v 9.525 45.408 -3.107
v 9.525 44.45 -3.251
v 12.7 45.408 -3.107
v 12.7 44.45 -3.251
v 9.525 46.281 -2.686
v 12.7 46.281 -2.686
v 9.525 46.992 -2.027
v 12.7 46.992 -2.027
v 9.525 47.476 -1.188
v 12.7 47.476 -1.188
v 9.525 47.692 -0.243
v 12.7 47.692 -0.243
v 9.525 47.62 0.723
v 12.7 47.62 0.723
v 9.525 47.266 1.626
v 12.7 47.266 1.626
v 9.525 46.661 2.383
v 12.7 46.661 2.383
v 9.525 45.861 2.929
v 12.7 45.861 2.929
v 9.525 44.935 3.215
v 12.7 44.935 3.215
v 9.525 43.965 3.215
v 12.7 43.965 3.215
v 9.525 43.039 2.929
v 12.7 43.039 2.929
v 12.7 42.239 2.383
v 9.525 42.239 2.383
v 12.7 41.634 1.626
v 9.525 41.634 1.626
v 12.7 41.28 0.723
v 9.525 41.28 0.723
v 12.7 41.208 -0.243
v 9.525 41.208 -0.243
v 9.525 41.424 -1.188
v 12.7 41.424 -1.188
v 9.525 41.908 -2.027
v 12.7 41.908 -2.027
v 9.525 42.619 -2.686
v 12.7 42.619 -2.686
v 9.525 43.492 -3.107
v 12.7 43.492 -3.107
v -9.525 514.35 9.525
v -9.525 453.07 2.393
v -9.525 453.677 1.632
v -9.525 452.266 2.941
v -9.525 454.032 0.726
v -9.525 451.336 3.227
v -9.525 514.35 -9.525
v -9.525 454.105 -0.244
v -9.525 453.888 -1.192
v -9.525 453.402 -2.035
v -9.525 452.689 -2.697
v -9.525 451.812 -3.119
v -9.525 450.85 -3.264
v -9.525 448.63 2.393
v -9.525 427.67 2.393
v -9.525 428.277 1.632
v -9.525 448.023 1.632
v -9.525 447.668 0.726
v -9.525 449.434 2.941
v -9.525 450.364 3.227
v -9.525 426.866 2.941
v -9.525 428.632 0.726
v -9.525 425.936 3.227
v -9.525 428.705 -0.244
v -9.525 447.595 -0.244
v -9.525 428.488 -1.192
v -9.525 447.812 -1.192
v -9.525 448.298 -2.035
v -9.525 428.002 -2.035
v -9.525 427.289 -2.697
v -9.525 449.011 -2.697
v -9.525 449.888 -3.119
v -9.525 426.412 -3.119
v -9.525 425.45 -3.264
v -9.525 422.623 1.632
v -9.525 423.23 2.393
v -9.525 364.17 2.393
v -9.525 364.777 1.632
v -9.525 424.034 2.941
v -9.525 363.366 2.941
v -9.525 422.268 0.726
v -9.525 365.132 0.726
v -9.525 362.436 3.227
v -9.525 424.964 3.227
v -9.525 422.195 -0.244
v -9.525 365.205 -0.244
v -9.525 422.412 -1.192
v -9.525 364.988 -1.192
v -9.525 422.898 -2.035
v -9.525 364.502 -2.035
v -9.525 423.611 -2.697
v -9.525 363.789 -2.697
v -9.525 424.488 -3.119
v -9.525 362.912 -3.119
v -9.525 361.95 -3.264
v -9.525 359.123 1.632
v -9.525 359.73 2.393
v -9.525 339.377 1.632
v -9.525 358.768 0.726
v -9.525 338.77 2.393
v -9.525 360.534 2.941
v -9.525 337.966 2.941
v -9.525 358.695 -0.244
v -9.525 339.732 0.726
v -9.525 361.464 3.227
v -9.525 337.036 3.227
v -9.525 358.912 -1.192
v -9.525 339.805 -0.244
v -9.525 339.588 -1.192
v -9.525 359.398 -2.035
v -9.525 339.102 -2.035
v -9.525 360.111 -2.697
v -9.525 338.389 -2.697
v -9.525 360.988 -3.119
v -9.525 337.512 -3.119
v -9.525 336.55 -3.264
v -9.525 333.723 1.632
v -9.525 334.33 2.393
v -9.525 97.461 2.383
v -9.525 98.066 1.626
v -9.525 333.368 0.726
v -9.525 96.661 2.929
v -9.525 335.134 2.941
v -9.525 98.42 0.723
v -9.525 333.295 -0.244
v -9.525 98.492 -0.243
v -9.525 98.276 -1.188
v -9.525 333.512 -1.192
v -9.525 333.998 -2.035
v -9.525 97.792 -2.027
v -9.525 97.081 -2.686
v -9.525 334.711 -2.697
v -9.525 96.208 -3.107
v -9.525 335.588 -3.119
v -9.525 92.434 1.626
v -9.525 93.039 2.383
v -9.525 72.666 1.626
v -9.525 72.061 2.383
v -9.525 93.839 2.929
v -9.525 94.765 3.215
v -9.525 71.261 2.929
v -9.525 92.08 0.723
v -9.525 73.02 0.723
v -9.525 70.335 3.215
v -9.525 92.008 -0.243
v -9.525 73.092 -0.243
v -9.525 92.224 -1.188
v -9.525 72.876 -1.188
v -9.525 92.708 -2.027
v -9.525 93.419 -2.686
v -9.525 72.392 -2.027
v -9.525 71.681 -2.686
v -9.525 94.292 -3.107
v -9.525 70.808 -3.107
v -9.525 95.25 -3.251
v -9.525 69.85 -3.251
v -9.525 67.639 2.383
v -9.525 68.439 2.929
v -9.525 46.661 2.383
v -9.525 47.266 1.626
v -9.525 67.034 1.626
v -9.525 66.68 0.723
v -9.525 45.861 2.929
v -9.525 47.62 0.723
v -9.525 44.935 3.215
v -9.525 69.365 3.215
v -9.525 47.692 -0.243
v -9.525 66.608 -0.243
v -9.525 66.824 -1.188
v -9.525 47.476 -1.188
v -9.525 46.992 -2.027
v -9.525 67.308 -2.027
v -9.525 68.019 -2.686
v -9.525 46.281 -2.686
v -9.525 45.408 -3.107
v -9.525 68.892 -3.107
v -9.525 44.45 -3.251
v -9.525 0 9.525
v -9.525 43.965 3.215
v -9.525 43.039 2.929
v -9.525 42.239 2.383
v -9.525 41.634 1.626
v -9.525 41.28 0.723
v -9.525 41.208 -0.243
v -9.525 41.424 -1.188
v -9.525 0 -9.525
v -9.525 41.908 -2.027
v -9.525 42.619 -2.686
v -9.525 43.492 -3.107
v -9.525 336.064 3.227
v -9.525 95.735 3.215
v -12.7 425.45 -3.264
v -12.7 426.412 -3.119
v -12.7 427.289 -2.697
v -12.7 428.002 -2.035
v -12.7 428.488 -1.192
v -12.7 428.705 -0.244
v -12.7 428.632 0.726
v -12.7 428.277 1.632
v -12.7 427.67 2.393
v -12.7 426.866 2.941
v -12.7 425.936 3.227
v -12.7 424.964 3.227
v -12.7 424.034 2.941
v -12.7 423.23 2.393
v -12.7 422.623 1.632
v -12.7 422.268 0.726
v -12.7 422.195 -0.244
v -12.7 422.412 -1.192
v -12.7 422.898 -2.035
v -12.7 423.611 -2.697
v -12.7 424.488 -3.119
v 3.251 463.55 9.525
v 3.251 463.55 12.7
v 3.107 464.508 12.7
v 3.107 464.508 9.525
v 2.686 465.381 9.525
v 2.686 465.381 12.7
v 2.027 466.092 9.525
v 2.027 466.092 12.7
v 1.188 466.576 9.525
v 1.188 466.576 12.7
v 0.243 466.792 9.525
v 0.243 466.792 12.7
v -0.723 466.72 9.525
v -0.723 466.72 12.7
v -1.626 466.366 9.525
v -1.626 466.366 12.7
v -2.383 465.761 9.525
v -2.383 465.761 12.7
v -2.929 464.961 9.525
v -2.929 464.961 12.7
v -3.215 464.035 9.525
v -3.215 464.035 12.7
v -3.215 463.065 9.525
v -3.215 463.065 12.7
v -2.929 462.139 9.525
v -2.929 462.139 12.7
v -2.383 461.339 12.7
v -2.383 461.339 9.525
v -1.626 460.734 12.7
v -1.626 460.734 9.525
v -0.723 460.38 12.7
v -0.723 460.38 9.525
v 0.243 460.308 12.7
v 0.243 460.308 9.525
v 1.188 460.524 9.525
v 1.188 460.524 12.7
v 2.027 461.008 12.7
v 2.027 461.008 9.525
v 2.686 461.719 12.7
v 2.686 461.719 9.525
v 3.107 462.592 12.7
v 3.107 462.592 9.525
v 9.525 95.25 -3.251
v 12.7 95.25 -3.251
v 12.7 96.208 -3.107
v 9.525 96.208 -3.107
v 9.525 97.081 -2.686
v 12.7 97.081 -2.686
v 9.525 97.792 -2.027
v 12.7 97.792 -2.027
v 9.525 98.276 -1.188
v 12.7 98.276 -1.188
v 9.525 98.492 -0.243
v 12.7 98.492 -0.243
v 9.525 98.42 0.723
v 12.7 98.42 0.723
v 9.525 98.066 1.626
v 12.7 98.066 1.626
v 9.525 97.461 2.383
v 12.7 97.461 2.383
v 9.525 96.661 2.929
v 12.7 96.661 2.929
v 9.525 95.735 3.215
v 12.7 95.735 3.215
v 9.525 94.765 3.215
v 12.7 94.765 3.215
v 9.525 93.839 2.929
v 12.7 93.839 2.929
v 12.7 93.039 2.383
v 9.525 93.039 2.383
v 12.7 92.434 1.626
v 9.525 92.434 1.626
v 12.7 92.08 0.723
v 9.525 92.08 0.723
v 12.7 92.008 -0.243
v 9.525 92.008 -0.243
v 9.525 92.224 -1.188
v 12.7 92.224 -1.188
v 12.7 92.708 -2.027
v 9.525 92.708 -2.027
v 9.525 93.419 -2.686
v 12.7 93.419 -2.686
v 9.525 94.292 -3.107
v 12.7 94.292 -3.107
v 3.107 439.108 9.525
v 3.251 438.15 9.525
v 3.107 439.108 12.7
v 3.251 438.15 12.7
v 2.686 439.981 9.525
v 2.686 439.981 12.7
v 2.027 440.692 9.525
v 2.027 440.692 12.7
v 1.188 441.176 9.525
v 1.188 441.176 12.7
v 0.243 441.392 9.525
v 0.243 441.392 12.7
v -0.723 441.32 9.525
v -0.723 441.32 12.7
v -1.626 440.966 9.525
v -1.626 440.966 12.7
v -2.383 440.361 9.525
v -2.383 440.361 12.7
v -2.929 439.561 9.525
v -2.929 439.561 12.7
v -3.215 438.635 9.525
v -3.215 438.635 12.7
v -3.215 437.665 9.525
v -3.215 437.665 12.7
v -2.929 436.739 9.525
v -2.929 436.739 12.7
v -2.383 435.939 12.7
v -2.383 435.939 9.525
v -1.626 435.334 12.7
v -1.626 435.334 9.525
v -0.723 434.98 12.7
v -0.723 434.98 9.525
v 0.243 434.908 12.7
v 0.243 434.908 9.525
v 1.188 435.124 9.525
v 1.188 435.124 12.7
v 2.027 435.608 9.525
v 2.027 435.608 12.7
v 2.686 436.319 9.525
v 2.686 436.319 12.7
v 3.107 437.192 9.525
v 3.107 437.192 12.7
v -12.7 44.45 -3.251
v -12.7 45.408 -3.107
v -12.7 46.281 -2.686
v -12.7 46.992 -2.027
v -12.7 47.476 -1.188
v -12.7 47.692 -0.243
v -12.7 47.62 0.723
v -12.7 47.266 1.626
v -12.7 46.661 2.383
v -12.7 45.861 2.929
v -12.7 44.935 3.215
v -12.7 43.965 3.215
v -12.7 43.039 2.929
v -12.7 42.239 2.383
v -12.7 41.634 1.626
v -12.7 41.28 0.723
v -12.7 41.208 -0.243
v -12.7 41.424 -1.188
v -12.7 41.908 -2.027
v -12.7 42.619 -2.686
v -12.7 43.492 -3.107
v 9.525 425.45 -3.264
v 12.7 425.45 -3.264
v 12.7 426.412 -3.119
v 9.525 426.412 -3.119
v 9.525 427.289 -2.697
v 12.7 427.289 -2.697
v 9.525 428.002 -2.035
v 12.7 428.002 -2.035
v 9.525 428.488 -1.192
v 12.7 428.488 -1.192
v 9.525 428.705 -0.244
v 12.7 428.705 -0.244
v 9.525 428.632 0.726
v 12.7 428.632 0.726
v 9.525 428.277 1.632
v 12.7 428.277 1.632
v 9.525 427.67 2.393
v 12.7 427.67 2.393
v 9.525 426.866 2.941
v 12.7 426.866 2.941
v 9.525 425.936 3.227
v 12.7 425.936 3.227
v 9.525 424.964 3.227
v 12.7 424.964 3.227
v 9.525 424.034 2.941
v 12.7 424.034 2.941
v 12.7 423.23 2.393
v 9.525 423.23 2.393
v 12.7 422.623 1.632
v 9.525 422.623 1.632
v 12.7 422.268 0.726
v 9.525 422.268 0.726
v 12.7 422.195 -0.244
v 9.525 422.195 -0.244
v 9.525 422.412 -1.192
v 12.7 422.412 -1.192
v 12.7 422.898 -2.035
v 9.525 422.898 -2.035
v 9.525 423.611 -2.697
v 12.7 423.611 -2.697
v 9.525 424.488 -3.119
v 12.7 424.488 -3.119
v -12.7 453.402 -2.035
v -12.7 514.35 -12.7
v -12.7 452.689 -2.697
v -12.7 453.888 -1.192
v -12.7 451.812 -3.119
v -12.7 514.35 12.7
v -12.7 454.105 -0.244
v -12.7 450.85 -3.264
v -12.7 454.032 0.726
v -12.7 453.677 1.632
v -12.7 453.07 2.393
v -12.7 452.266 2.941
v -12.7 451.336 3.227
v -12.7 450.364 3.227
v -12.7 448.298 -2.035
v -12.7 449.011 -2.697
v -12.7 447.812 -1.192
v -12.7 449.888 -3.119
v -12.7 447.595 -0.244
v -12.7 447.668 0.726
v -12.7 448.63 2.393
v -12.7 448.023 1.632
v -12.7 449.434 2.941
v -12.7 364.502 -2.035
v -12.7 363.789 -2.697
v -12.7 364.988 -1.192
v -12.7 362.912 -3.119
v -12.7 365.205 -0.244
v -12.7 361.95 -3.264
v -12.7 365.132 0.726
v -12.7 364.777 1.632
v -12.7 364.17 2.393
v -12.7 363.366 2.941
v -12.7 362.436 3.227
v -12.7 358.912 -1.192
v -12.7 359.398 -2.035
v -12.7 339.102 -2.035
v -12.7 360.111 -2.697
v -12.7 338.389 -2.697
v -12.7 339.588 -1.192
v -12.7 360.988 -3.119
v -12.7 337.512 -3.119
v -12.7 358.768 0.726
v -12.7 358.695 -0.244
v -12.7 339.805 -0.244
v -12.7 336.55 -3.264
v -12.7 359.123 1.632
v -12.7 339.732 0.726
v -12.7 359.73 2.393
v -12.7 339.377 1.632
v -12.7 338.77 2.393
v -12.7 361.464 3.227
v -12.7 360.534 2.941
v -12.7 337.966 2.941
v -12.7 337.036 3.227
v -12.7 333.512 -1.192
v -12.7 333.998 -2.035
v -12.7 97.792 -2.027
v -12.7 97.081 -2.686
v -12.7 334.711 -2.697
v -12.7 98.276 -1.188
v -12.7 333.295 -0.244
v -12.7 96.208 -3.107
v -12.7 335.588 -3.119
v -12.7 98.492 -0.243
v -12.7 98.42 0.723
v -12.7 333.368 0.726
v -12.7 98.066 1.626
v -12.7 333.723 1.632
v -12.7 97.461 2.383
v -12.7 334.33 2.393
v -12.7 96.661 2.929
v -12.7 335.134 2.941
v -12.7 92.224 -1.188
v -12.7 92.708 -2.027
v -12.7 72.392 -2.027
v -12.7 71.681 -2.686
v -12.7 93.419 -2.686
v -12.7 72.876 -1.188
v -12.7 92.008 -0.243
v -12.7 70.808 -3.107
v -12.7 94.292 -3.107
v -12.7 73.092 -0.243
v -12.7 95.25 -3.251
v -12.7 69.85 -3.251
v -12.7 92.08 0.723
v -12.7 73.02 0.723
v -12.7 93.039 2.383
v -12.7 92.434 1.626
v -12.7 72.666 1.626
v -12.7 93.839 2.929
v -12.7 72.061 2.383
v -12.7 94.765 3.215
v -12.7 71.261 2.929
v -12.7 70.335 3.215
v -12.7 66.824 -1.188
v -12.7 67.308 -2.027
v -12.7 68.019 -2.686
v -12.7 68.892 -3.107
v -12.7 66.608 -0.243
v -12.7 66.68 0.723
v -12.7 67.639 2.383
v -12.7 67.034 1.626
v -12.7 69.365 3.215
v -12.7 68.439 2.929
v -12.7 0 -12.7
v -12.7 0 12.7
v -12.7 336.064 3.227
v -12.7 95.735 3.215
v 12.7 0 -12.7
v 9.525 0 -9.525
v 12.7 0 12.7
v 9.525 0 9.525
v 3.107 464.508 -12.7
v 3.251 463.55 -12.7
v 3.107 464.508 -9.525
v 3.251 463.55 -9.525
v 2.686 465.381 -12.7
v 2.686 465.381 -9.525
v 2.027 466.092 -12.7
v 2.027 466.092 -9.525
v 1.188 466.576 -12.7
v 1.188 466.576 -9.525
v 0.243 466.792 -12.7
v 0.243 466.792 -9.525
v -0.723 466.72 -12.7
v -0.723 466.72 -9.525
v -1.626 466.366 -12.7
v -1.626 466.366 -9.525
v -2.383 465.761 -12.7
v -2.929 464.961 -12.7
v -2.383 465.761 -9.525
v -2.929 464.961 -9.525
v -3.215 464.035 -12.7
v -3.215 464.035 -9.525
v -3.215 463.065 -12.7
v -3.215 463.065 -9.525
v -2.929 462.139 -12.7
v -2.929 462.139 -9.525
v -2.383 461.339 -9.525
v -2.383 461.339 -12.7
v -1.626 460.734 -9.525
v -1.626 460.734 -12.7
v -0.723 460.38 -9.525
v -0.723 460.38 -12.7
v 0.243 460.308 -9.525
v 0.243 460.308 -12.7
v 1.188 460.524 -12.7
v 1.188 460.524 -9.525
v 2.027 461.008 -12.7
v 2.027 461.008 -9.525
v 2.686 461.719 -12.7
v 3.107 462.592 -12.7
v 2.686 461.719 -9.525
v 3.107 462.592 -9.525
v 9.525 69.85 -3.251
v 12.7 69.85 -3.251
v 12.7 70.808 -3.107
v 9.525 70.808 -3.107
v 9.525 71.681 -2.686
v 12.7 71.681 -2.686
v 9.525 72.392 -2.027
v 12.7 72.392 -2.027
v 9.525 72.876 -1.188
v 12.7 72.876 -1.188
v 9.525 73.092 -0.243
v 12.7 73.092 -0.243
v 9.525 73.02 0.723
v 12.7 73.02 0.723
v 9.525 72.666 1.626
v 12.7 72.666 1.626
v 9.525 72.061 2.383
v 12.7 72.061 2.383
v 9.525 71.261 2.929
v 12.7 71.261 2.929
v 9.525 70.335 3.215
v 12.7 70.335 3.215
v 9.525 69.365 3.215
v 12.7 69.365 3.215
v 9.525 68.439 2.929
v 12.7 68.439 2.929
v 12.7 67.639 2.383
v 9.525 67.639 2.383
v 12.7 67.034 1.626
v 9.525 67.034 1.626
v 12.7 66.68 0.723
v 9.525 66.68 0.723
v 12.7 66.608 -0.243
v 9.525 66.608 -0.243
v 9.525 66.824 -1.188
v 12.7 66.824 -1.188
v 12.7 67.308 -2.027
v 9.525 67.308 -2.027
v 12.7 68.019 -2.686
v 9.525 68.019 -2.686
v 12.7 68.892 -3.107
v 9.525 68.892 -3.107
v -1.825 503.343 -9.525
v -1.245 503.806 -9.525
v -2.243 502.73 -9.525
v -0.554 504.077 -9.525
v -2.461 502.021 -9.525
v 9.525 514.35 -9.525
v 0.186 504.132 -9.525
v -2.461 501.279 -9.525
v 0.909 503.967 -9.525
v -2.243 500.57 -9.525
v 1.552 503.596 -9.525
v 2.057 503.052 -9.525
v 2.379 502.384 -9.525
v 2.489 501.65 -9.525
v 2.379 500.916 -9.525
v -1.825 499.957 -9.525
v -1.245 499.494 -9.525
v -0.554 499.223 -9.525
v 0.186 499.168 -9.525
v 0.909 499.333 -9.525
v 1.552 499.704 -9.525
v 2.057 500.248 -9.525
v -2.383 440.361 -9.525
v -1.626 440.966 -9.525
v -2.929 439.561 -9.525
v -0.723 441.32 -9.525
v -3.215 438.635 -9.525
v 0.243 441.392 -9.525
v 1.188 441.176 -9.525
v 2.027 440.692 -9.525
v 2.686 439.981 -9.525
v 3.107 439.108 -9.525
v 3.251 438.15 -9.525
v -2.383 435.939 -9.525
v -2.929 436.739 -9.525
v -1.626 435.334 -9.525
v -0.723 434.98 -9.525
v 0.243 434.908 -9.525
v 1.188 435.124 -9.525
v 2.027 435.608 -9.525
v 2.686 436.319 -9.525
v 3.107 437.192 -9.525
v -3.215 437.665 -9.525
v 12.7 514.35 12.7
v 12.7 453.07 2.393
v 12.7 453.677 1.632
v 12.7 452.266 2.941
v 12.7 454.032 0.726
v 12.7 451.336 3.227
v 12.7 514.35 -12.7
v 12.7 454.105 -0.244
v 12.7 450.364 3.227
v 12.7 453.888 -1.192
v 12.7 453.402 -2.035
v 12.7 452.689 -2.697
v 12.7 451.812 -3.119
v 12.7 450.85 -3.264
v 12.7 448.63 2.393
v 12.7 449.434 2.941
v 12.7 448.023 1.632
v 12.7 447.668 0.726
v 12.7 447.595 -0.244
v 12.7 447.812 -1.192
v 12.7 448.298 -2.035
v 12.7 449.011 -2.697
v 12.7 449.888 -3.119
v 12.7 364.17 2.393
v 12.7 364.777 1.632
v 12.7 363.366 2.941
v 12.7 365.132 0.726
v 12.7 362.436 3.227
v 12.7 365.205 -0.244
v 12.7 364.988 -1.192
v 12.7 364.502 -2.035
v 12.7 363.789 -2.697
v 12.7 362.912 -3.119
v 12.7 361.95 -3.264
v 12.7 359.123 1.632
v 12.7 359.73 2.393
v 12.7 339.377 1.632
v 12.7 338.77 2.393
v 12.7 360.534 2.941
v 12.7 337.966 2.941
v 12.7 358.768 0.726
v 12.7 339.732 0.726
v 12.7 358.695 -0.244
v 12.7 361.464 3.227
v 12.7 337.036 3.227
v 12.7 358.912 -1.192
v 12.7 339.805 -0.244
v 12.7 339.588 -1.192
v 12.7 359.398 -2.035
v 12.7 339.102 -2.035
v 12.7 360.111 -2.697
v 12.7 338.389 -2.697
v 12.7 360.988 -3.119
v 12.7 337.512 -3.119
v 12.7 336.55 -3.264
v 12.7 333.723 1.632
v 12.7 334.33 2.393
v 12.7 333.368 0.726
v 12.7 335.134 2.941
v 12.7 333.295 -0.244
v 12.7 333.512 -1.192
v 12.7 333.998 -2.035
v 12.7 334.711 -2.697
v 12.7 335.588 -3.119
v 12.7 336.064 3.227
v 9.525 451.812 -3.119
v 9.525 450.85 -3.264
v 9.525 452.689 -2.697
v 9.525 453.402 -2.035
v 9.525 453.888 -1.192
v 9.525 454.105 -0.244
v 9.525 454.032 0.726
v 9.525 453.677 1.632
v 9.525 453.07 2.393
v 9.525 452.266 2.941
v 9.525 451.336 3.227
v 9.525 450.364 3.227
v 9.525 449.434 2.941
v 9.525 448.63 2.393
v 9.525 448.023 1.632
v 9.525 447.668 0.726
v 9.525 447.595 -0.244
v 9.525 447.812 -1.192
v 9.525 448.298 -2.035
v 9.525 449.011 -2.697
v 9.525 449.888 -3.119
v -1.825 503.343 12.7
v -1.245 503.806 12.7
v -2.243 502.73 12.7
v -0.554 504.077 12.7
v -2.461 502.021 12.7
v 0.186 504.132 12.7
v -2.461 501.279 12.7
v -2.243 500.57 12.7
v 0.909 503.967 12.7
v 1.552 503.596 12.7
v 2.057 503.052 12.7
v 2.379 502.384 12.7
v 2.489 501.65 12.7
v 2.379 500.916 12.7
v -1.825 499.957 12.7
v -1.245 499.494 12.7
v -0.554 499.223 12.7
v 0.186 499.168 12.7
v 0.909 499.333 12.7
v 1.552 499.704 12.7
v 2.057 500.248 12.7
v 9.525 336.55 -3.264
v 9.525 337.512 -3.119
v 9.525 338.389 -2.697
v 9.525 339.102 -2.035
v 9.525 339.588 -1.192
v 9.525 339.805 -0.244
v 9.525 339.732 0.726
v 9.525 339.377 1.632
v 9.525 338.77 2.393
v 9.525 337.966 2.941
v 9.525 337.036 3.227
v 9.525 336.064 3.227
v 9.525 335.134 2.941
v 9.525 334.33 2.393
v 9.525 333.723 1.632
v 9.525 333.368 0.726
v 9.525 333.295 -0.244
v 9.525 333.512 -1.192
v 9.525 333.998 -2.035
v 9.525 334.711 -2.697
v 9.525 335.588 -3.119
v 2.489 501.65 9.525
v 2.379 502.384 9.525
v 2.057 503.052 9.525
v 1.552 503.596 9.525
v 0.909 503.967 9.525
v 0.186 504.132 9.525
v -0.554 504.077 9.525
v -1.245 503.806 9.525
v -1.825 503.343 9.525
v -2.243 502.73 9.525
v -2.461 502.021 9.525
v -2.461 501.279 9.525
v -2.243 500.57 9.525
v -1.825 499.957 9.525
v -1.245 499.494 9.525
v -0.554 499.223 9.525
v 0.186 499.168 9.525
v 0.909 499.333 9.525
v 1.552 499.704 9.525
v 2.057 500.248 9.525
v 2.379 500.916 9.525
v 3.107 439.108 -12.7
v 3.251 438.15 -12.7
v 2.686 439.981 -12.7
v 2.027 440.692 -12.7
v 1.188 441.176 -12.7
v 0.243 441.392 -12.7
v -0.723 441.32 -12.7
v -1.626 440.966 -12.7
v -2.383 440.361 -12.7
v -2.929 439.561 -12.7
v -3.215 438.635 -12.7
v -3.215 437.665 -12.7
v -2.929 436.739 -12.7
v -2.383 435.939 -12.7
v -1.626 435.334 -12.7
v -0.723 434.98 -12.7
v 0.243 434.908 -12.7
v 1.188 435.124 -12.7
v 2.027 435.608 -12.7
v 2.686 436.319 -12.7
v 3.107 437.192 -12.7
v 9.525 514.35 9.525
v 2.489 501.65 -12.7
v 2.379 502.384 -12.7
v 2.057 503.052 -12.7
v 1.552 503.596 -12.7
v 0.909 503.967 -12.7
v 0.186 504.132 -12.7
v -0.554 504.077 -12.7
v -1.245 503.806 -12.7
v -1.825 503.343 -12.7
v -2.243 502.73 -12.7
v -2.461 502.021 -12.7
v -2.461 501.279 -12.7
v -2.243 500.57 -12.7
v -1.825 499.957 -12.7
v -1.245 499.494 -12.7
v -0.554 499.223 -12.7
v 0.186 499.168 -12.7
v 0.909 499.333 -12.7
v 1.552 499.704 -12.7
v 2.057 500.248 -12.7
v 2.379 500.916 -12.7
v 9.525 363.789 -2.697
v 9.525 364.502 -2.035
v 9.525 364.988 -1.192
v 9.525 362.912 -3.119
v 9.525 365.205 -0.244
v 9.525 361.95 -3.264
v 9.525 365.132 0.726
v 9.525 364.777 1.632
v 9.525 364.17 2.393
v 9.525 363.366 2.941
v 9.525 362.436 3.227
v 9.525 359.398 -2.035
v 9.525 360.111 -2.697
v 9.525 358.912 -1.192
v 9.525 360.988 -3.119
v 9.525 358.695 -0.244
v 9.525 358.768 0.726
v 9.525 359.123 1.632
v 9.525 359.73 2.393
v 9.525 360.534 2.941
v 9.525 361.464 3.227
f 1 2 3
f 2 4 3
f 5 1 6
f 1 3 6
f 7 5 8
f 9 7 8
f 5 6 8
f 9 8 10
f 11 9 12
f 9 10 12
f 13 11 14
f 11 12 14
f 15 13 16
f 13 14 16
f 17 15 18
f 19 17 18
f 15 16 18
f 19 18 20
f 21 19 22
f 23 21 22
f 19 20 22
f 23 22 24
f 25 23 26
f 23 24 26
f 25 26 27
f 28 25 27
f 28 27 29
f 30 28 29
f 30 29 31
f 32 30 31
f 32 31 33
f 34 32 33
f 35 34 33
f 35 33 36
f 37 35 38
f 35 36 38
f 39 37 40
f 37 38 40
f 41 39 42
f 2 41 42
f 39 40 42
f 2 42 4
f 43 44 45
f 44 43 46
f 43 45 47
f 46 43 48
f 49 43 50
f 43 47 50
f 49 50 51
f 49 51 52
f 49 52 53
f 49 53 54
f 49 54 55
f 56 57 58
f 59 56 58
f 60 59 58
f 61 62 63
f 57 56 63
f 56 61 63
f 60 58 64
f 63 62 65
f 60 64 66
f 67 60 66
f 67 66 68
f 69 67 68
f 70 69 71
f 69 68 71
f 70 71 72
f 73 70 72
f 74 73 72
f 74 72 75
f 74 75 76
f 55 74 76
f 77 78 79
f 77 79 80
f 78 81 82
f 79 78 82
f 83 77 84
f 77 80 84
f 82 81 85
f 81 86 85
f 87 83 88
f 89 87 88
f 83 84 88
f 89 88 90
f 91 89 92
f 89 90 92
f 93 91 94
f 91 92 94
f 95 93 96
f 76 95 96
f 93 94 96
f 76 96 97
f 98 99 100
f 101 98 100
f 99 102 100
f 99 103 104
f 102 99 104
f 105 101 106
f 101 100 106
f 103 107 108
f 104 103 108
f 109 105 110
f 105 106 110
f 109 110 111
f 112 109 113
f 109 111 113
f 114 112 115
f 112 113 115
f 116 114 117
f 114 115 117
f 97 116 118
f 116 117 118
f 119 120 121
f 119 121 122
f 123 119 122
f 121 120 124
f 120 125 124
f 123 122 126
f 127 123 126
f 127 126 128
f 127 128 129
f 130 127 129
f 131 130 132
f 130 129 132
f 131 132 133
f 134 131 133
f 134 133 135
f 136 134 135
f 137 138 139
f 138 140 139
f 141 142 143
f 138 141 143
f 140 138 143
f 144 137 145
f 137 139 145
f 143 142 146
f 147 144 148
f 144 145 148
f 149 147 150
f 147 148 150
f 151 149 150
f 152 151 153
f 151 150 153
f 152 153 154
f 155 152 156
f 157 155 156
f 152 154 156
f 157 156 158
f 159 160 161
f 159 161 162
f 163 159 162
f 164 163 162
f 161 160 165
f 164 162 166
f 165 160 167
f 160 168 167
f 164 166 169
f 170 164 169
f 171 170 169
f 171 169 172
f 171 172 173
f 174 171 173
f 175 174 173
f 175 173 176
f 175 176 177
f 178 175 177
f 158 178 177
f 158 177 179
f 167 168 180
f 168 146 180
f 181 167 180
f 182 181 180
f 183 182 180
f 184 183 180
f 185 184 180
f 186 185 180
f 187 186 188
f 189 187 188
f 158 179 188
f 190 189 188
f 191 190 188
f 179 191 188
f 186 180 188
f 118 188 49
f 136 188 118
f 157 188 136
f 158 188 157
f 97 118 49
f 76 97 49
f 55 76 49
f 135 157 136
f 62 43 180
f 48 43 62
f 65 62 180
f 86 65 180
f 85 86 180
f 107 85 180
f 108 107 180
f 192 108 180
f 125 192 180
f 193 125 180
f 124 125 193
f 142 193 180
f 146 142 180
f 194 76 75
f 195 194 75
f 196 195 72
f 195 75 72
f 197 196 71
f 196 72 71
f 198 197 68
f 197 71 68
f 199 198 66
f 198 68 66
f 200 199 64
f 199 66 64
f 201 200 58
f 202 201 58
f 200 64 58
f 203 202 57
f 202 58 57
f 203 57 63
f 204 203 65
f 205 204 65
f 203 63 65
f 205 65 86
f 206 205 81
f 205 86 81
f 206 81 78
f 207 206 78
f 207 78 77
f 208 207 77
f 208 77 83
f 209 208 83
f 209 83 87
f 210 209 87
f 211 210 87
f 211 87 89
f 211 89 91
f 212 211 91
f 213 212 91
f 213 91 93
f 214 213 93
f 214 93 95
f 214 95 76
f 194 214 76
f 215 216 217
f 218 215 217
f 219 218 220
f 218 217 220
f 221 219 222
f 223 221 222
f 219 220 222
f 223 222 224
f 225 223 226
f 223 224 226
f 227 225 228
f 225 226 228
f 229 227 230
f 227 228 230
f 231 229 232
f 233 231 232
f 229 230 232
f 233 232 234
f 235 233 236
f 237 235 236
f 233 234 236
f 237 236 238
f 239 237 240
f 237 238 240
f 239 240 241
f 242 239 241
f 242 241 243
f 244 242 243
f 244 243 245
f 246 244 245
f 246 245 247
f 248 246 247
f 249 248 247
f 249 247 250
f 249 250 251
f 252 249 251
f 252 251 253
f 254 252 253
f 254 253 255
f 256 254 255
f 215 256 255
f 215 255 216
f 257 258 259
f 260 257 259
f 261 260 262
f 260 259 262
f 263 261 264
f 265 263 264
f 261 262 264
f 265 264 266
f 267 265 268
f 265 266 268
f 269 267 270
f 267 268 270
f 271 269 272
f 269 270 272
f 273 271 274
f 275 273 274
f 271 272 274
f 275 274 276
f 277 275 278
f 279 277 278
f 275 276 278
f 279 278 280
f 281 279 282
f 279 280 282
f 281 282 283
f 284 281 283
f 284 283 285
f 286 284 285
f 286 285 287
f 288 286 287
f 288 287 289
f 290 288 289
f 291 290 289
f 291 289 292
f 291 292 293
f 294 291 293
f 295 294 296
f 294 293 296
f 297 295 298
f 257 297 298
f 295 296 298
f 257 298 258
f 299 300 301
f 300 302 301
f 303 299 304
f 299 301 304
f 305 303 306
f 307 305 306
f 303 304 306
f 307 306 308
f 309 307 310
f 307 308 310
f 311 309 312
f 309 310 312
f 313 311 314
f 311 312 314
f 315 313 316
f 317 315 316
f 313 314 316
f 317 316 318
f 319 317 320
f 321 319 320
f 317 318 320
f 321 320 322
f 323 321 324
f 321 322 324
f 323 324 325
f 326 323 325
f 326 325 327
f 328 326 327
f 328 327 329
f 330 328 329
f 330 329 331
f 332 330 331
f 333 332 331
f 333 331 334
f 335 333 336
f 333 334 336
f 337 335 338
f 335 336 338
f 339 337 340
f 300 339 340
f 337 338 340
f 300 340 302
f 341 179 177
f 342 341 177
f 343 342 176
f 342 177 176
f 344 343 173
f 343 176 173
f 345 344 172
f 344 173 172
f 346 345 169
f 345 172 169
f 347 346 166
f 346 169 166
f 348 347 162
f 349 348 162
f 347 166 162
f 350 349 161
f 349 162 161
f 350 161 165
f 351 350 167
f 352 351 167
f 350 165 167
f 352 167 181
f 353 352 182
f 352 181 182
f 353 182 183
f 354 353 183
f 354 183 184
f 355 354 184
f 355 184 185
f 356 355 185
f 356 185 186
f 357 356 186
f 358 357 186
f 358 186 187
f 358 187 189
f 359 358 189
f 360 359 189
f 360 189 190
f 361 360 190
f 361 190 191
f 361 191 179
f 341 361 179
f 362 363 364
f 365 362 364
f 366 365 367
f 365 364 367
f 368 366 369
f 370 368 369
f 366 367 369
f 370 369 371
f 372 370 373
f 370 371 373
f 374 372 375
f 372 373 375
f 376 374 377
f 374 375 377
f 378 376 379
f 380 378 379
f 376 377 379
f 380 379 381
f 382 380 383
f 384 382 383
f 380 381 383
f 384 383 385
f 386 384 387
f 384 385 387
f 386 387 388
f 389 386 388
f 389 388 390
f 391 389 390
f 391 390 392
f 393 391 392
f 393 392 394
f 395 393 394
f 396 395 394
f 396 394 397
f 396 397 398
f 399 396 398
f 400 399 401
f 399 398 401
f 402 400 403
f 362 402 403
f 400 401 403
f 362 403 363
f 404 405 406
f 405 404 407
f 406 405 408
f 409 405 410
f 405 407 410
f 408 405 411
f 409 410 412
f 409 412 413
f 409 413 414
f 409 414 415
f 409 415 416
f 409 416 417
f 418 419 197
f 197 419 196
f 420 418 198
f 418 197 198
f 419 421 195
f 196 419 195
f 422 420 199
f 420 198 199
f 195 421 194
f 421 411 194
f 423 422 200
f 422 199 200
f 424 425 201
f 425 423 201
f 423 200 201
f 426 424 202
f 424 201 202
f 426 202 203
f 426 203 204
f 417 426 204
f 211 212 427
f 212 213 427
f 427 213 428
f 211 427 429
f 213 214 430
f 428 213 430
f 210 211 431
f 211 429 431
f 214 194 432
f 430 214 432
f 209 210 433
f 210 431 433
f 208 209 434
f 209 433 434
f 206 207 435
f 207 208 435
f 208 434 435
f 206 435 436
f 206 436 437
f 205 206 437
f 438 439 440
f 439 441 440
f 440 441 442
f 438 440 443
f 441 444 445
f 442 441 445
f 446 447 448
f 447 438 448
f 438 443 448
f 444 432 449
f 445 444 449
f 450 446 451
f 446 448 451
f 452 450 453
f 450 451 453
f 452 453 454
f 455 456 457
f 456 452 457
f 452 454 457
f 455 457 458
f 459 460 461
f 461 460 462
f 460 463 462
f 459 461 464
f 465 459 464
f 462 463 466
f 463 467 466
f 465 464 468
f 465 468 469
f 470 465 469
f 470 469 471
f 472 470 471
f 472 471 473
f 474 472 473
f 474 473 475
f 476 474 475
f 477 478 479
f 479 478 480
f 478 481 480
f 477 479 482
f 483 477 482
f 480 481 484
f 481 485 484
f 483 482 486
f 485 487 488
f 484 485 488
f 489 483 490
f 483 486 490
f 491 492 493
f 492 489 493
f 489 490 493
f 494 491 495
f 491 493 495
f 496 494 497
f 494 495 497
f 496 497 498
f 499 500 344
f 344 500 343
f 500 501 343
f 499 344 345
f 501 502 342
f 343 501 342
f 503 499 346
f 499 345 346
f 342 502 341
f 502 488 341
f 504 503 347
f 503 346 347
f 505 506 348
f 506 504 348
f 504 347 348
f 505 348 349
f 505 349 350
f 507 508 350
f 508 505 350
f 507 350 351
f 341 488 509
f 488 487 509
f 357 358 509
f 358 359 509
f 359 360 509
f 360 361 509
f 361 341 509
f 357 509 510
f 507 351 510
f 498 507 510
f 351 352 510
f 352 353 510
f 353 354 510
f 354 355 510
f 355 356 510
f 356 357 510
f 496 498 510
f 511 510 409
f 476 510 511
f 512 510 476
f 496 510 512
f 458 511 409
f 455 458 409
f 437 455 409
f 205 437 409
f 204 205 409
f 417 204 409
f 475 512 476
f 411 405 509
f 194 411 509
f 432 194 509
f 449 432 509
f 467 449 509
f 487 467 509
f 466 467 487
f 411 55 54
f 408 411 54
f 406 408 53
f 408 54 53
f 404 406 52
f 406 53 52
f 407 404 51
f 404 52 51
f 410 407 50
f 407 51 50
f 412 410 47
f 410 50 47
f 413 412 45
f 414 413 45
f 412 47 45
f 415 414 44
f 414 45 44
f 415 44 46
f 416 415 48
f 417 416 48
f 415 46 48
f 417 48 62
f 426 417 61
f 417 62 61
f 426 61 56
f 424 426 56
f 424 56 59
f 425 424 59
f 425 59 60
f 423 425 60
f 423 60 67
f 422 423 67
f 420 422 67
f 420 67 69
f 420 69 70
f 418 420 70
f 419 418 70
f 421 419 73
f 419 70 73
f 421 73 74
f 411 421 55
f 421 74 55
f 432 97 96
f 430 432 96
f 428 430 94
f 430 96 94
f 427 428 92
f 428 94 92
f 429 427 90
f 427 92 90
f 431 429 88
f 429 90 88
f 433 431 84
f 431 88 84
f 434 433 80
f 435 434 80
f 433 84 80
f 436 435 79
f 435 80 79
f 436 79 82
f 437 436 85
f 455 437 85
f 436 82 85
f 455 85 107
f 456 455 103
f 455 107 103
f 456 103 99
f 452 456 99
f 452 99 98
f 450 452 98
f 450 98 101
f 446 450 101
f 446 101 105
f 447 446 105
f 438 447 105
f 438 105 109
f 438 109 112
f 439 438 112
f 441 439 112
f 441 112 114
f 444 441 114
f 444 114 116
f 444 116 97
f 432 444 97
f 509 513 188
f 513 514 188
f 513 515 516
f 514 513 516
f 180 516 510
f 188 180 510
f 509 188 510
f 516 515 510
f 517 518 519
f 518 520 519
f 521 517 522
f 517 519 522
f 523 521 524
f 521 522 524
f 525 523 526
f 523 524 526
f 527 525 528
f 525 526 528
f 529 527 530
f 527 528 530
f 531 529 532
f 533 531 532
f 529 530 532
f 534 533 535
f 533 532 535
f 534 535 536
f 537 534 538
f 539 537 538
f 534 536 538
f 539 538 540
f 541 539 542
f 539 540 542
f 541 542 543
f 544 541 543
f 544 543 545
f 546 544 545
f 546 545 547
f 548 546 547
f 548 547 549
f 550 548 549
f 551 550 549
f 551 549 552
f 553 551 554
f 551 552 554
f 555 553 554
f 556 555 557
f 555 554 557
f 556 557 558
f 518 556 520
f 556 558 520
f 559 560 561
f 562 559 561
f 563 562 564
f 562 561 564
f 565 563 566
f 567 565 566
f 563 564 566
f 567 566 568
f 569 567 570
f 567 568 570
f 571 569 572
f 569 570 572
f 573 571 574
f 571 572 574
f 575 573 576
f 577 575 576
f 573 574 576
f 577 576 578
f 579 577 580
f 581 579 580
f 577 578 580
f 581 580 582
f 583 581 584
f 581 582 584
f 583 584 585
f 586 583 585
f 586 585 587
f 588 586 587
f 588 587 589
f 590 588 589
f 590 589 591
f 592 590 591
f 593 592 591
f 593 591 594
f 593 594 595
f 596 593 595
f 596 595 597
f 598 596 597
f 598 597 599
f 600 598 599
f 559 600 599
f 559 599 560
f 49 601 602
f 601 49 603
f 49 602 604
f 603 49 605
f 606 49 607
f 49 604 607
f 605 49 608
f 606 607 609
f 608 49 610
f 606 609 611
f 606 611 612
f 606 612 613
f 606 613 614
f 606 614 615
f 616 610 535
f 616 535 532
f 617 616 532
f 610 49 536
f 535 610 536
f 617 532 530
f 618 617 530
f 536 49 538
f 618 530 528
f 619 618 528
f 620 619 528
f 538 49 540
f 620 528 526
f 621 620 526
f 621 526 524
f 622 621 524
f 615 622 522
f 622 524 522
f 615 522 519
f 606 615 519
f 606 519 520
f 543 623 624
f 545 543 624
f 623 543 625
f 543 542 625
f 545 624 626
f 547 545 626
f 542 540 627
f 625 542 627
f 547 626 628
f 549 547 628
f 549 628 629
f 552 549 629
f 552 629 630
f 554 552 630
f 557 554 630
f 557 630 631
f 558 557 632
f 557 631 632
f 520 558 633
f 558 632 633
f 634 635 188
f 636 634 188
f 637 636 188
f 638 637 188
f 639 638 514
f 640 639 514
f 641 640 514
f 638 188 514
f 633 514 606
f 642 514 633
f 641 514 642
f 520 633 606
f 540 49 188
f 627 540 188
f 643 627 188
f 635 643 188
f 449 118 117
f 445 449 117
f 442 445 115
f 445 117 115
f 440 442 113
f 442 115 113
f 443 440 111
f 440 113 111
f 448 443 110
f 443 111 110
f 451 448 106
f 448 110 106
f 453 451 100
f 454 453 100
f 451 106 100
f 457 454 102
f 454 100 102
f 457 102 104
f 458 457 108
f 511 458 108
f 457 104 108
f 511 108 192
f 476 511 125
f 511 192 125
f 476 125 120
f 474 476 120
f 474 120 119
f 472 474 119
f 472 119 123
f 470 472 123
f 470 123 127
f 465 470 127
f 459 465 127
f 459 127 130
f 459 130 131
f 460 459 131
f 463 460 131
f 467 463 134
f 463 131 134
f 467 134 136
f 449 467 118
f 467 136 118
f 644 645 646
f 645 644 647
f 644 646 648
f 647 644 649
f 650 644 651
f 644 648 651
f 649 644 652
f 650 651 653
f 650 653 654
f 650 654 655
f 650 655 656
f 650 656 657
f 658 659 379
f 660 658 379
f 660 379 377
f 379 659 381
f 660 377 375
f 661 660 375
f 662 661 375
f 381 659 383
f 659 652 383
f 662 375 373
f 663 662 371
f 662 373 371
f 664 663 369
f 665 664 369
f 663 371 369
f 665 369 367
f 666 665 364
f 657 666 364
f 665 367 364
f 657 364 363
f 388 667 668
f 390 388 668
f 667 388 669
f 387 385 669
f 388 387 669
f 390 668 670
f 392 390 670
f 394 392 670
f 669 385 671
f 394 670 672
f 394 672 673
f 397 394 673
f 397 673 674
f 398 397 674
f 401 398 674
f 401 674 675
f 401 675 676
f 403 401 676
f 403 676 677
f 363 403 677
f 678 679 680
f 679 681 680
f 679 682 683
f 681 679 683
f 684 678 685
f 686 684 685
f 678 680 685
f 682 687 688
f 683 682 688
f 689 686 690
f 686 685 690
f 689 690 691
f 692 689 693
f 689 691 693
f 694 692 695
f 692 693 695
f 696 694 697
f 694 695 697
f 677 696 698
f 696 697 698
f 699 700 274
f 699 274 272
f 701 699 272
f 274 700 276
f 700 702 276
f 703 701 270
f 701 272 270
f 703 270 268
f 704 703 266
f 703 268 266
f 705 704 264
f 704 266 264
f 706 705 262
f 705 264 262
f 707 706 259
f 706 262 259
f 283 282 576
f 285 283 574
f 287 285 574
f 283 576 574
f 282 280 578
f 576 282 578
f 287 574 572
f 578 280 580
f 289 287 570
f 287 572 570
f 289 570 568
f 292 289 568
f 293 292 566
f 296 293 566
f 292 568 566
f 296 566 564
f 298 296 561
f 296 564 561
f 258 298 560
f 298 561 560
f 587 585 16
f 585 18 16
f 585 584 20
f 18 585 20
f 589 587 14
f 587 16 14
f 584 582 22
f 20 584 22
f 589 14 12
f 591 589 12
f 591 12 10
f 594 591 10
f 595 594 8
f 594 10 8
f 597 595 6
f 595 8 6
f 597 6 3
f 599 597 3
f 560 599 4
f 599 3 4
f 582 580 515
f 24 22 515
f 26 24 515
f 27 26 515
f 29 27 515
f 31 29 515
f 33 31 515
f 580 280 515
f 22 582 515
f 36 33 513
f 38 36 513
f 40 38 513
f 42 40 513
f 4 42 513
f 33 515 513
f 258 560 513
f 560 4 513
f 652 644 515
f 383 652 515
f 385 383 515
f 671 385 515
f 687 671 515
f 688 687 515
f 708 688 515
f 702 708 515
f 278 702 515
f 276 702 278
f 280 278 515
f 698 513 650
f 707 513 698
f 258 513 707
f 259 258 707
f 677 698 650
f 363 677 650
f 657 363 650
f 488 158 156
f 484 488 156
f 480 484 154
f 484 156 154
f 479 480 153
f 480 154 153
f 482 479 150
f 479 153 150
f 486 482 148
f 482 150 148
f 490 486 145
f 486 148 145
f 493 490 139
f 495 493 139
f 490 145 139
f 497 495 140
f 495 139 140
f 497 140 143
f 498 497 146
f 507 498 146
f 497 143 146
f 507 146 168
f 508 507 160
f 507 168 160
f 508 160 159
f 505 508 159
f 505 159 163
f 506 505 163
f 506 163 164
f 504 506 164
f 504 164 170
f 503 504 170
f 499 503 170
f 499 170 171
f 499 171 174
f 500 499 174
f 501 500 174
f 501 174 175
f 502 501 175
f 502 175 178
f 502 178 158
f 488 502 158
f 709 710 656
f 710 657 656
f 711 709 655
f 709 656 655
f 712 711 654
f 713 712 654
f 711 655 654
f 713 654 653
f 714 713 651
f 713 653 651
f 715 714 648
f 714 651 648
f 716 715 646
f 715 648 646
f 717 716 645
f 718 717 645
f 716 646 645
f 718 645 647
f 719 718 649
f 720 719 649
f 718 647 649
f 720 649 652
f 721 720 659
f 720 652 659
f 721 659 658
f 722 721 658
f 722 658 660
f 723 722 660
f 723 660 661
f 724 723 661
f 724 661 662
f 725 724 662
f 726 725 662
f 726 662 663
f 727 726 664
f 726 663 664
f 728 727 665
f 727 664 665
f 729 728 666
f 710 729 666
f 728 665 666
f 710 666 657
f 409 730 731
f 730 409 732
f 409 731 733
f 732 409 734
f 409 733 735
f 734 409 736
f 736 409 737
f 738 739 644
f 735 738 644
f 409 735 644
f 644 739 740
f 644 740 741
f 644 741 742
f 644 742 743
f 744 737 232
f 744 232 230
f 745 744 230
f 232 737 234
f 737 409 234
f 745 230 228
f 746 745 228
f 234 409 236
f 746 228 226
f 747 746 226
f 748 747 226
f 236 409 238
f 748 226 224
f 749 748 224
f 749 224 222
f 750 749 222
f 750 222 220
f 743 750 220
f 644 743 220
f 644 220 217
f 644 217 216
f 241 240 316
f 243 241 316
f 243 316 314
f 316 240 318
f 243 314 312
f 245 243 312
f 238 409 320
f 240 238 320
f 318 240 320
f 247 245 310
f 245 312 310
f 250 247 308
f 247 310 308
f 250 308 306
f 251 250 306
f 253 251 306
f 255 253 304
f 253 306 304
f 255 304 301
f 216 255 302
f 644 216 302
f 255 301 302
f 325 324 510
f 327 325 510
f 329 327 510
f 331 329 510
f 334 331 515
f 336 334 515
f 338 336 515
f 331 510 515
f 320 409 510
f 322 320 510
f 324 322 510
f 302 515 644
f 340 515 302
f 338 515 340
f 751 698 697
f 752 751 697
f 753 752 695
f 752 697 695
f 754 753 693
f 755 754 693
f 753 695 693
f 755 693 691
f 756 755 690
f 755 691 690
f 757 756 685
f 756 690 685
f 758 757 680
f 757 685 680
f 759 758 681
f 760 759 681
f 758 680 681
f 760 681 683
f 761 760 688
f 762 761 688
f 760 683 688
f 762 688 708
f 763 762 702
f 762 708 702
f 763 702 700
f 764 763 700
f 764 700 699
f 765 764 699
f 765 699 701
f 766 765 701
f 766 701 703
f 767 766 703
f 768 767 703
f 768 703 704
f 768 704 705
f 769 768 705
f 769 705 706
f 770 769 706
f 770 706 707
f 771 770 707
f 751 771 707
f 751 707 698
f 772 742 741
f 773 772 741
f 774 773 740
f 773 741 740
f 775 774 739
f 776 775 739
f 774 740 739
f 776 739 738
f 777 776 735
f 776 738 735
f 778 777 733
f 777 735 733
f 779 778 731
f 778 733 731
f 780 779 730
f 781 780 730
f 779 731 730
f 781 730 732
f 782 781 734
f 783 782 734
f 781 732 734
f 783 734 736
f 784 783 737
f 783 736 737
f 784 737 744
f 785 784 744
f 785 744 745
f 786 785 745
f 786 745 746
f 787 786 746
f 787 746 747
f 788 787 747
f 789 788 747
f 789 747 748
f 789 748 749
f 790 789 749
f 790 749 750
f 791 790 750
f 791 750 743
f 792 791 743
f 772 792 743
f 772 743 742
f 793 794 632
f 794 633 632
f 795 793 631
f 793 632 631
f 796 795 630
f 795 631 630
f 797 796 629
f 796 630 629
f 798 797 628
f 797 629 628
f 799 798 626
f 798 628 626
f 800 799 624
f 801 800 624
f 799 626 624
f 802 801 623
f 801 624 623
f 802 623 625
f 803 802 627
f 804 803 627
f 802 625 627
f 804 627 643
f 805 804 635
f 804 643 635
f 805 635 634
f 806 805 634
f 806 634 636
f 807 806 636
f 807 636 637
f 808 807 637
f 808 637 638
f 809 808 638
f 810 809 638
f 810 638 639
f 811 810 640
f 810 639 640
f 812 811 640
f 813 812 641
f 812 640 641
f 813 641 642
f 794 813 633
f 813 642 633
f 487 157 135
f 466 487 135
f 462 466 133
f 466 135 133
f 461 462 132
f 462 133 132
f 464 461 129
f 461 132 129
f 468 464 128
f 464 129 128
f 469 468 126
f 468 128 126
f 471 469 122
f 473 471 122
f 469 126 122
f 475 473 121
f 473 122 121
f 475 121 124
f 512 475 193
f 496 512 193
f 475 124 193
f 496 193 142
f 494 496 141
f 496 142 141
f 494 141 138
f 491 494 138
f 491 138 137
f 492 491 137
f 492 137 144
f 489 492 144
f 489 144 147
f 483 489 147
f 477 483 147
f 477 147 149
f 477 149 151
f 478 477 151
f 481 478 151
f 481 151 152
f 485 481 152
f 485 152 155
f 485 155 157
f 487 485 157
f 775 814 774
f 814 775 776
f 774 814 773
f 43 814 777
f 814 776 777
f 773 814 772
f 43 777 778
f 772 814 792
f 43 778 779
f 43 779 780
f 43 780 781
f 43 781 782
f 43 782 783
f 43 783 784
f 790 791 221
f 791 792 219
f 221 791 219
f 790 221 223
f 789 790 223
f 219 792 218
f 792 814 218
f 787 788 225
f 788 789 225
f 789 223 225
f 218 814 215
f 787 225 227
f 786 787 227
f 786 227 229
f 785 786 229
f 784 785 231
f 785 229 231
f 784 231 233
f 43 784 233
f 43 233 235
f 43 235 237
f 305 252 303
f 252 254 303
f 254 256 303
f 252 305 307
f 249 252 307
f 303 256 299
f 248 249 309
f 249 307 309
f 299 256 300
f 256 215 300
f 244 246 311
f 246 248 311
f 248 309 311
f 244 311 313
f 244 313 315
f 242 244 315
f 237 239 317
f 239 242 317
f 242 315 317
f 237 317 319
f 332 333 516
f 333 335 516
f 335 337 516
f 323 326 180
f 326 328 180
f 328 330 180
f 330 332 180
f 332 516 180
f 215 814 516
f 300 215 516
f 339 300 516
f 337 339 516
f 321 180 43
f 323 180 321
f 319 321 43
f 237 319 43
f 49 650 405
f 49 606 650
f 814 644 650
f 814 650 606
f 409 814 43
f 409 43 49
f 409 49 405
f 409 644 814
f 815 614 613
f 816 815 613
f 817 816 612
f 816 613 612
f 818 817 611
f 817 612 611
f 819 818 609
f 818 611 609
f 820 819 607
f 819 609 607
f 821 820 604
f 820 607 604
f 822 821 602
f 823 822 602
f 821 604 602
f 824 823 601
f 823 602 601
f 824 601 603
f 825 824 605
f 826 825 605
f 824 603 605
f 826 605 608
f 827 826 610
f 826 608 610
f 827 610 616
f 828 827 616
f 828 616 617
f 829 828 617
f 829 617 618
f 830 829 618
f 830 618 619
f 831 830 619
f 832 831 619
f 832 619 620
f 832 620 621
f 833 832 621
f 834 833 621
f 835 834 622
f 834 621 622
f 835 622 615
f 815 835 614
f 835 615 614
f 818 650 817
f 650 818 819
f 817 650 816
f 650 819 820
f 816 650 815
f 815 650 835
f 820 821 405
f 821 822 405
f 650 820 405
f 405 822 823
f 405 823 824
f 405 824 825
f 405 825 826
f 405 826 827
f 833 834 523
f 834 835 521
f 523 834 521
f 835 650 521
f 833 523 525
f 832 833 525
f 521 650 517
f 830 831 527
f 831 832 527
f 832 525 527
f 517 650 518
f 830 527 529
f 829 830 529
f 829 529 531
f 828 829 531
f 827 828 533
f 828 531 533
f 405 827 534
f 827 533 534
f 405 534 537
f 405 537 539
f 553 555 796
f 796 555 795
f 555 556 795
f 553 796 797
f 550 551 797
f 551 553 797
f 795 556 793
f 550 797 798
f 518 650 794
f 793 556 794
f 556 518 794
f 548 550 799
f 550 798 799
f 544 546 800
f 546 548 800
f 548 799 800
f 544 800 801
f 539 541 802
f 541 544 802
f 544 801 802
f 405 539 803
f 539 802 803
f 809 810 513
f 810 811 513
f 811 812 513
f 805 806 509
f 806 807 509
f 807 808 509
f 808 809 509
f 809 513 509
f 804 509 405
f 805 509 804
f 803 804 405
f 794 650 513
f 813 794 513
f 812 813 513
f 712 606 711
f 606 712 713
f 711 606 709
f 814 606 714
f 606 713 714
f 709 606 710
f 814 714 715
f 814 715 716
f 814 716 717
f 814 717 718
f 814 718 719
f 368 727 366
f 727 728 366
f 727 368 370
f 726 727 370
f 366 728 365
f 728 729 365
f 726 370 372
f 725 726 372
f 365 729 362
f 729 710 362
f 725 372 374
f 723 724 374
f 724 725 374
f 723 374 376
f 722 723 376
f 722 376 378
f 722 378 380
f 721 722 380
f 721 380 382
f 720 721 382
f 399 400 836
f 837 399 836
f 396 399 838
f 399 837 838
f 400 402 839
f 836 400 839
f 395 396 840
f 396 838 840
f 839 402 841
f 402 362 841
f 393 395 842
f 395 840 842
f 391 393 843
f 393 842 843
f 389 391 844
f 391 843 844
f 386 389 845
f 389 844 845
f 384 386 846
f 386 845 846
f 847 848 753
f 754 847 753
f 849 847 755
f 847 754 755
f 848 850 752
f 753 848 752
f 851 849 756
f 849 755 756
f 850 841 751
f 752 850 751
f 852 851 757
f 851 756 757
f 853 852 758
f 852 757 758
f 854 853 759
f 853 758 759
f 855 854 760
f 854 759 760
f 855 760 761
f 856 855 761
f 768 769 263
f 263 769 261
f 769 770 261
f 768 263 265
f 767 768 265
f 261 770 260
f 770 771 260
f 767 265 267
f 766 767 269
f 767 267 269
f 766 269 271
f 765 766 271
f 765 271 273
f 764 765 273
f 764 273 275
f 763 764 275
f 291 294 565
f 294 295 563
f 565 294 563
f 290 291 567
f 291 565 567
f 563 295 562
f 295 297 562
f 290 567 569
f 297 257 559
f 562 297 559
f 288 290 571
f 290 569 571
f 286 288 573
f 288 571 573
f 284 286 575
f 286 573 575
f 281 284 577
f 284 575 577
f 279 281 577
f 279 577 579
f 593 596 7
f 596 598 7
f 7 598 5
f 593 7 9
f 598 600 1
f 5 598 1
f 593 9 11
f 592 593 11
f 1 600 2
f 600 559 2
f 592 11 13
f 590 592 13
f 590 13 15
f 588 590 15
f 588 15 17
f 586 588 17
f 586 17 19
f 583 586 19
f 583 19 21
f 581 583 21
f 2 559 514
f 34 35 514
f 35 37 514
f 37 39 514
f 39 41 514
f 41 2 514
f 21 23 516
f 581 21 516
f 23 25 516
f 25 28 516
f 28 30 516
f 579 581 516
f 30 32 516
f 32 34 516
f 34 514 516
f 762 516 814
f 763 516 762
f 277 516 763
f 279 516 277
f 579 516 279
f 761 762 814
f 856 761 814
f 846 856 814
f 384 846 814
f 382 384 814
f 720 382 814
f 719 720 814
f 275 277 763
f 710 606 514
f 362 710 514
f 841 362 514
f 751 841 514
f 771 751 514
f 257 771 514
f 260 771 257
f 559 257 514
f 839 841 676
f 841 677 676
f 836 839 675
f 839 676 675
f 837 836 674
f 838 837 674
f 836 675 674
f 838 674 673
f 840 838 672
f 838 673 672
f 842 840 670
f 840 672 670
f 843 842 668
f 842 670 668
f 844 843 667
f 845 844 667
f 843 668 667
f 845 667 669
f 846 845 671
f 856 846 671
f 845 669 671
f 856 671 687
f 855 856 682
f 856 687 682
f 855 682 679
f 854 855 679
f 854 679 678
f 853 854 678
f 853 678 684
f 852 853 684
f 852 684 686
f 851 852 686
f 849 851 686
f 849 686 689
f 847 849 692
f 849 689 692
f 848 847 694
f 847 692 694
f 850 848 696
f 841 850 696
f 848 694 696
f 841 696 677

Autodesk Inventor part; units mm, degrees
ref_plane "YZ Plane" through (0, 0, 0) normal (1, 0, 0) x (0, 1, 0)
ref_plane "XZ Plane" through (0, 0, 0) normal (0, 1, 0) x (-1, 0, 0)
ref_plane "XY Plane" through (0, 0, 0) normal (0, 0, 1) x (1, 0, 0)
sketch "Sketch1" plane through (0, 0, 0) normal (0, 1, 0) x (-1, 0, 0)
  line L0 (-12.7, -12.7) -> (12.7, -12.7)
  line L1 (12.7, -12.7) -> (12.7, 12.7)
  line L2 (12.7, 12.7) -> (-12.7, 12.7)
  line L3 (-12.7, 12.7) -> (-12.7, -12.7)
  line L4 (-12.7, -12.7) -> (12.7, 12.7) construction
  line L5 (12.7, -12.7) -> (-12.7, 12.7) construction
  line L6 (9.525, 9.525) -> (9.525, -9.525)
  line L7 (9.525, -9.525) -> (-9.525, -9.525)
  line L8 (-9.525, -9.525) -> (-9.525, 9.525)
  line L9 (-9.525, 9.525) -> (9.525, 9.525)
  point P0 (0, 0)
  dimension "d0" = 25.4
  dimension "d1" = 25.4
  dimension "d2" = 3.175
extrude "Extrusion1" add sketch "Sketch1" along normal blind 514.35
sketch "Sketch4" plane through (-12.7, 0, 12.7) normal (0, 0, 1) x (1, 0, 0)
  line L0 (25.4, 488.95) -> (0, 488.95) construction
  line L1 (0, 488.95) -> (0, 514.35) construction
  line L2 (0, 514.35) -> (25.4, 514.35) construction
  line L3 (25.4, 514.35) -> (25.4, 488.95) construction
  line L4 (25.4, 488.95) -> (0, 514.35) construction
  line L5 (0, 488.95) -> (25.4, 514.35) construction
  circle A0 centre (12.7, 501.65) radius 2.4892
  circle A1 centre (12.7, 463.55) radius 3.2512
  circle A2 centre (12.7, 438.15) radius 3.2512
  point P0 (12.7, 0)
  dimension "d18" = 25.4
  dimension "d19" = 25.4
  dimension "d20" = 4.9784
  dimension "d21" = 6.5024
  dimension "d23" = 25.4
  dimension "d26" = 25.4
extrude "Extrusion4" cut sketch "Sketch4" against normal blind 25.4
sketch "Sketch5" plane through (12.7, 0, 12.7) normal (1, 0, 0) x (0, 0, -1)
  line L0 (0, 0) -> (25.4, 0) construction
  line L1 (3.175, 0) -> (22.225, 0) construction
  line L2 (22.225, 0) -> (22.225, 38.1) construction
  line L3 (22.225, 38.1) -> (3.175, 38.1) construction
  line L4 (3.175, 38.1) -> (3.175, 0) construction
  circle A0 centre (12.7, 44.45) radius 3.2512
  circle A1 centre (12.7, 69.85) radius 3.2512
  circle A2 centre (12.7, 95.25) radius 3.2512
  circle A3 centre (12.7, 336.55) radius 3.2639
  circle A4 centre (12.7, 361.95) radius 3.2639
  circle A5 centre (12.7, 425.45) radius 3.2639
  circle A6 centre (12.7, 450.85) radius 3.2639
  point P0 (12.7, 0)
  point P1 (12.7, 38.1)
  dimension "d27" = 19.05
  dimension "d28" = 38.1
  dimension "d29" = 3.175
  dimension "d30" = 6.5024
  dimension "d31" = 6.35
  dimension "d32" = 25.4
  dimension "d33" = 25.4
  dimension "d38" = 6.5278
  dimension "d39" = 336.55
  dimension "d40" = 25.4
  dimension "d41" = 63.5
  dimension "d42" = 25.4
extrude "Extrusion5" cut sketch "Sketch5" against normal blind 25.4
properties part number "STRU_012_BilletPoleMiddle" material "Aluminum 6061"
